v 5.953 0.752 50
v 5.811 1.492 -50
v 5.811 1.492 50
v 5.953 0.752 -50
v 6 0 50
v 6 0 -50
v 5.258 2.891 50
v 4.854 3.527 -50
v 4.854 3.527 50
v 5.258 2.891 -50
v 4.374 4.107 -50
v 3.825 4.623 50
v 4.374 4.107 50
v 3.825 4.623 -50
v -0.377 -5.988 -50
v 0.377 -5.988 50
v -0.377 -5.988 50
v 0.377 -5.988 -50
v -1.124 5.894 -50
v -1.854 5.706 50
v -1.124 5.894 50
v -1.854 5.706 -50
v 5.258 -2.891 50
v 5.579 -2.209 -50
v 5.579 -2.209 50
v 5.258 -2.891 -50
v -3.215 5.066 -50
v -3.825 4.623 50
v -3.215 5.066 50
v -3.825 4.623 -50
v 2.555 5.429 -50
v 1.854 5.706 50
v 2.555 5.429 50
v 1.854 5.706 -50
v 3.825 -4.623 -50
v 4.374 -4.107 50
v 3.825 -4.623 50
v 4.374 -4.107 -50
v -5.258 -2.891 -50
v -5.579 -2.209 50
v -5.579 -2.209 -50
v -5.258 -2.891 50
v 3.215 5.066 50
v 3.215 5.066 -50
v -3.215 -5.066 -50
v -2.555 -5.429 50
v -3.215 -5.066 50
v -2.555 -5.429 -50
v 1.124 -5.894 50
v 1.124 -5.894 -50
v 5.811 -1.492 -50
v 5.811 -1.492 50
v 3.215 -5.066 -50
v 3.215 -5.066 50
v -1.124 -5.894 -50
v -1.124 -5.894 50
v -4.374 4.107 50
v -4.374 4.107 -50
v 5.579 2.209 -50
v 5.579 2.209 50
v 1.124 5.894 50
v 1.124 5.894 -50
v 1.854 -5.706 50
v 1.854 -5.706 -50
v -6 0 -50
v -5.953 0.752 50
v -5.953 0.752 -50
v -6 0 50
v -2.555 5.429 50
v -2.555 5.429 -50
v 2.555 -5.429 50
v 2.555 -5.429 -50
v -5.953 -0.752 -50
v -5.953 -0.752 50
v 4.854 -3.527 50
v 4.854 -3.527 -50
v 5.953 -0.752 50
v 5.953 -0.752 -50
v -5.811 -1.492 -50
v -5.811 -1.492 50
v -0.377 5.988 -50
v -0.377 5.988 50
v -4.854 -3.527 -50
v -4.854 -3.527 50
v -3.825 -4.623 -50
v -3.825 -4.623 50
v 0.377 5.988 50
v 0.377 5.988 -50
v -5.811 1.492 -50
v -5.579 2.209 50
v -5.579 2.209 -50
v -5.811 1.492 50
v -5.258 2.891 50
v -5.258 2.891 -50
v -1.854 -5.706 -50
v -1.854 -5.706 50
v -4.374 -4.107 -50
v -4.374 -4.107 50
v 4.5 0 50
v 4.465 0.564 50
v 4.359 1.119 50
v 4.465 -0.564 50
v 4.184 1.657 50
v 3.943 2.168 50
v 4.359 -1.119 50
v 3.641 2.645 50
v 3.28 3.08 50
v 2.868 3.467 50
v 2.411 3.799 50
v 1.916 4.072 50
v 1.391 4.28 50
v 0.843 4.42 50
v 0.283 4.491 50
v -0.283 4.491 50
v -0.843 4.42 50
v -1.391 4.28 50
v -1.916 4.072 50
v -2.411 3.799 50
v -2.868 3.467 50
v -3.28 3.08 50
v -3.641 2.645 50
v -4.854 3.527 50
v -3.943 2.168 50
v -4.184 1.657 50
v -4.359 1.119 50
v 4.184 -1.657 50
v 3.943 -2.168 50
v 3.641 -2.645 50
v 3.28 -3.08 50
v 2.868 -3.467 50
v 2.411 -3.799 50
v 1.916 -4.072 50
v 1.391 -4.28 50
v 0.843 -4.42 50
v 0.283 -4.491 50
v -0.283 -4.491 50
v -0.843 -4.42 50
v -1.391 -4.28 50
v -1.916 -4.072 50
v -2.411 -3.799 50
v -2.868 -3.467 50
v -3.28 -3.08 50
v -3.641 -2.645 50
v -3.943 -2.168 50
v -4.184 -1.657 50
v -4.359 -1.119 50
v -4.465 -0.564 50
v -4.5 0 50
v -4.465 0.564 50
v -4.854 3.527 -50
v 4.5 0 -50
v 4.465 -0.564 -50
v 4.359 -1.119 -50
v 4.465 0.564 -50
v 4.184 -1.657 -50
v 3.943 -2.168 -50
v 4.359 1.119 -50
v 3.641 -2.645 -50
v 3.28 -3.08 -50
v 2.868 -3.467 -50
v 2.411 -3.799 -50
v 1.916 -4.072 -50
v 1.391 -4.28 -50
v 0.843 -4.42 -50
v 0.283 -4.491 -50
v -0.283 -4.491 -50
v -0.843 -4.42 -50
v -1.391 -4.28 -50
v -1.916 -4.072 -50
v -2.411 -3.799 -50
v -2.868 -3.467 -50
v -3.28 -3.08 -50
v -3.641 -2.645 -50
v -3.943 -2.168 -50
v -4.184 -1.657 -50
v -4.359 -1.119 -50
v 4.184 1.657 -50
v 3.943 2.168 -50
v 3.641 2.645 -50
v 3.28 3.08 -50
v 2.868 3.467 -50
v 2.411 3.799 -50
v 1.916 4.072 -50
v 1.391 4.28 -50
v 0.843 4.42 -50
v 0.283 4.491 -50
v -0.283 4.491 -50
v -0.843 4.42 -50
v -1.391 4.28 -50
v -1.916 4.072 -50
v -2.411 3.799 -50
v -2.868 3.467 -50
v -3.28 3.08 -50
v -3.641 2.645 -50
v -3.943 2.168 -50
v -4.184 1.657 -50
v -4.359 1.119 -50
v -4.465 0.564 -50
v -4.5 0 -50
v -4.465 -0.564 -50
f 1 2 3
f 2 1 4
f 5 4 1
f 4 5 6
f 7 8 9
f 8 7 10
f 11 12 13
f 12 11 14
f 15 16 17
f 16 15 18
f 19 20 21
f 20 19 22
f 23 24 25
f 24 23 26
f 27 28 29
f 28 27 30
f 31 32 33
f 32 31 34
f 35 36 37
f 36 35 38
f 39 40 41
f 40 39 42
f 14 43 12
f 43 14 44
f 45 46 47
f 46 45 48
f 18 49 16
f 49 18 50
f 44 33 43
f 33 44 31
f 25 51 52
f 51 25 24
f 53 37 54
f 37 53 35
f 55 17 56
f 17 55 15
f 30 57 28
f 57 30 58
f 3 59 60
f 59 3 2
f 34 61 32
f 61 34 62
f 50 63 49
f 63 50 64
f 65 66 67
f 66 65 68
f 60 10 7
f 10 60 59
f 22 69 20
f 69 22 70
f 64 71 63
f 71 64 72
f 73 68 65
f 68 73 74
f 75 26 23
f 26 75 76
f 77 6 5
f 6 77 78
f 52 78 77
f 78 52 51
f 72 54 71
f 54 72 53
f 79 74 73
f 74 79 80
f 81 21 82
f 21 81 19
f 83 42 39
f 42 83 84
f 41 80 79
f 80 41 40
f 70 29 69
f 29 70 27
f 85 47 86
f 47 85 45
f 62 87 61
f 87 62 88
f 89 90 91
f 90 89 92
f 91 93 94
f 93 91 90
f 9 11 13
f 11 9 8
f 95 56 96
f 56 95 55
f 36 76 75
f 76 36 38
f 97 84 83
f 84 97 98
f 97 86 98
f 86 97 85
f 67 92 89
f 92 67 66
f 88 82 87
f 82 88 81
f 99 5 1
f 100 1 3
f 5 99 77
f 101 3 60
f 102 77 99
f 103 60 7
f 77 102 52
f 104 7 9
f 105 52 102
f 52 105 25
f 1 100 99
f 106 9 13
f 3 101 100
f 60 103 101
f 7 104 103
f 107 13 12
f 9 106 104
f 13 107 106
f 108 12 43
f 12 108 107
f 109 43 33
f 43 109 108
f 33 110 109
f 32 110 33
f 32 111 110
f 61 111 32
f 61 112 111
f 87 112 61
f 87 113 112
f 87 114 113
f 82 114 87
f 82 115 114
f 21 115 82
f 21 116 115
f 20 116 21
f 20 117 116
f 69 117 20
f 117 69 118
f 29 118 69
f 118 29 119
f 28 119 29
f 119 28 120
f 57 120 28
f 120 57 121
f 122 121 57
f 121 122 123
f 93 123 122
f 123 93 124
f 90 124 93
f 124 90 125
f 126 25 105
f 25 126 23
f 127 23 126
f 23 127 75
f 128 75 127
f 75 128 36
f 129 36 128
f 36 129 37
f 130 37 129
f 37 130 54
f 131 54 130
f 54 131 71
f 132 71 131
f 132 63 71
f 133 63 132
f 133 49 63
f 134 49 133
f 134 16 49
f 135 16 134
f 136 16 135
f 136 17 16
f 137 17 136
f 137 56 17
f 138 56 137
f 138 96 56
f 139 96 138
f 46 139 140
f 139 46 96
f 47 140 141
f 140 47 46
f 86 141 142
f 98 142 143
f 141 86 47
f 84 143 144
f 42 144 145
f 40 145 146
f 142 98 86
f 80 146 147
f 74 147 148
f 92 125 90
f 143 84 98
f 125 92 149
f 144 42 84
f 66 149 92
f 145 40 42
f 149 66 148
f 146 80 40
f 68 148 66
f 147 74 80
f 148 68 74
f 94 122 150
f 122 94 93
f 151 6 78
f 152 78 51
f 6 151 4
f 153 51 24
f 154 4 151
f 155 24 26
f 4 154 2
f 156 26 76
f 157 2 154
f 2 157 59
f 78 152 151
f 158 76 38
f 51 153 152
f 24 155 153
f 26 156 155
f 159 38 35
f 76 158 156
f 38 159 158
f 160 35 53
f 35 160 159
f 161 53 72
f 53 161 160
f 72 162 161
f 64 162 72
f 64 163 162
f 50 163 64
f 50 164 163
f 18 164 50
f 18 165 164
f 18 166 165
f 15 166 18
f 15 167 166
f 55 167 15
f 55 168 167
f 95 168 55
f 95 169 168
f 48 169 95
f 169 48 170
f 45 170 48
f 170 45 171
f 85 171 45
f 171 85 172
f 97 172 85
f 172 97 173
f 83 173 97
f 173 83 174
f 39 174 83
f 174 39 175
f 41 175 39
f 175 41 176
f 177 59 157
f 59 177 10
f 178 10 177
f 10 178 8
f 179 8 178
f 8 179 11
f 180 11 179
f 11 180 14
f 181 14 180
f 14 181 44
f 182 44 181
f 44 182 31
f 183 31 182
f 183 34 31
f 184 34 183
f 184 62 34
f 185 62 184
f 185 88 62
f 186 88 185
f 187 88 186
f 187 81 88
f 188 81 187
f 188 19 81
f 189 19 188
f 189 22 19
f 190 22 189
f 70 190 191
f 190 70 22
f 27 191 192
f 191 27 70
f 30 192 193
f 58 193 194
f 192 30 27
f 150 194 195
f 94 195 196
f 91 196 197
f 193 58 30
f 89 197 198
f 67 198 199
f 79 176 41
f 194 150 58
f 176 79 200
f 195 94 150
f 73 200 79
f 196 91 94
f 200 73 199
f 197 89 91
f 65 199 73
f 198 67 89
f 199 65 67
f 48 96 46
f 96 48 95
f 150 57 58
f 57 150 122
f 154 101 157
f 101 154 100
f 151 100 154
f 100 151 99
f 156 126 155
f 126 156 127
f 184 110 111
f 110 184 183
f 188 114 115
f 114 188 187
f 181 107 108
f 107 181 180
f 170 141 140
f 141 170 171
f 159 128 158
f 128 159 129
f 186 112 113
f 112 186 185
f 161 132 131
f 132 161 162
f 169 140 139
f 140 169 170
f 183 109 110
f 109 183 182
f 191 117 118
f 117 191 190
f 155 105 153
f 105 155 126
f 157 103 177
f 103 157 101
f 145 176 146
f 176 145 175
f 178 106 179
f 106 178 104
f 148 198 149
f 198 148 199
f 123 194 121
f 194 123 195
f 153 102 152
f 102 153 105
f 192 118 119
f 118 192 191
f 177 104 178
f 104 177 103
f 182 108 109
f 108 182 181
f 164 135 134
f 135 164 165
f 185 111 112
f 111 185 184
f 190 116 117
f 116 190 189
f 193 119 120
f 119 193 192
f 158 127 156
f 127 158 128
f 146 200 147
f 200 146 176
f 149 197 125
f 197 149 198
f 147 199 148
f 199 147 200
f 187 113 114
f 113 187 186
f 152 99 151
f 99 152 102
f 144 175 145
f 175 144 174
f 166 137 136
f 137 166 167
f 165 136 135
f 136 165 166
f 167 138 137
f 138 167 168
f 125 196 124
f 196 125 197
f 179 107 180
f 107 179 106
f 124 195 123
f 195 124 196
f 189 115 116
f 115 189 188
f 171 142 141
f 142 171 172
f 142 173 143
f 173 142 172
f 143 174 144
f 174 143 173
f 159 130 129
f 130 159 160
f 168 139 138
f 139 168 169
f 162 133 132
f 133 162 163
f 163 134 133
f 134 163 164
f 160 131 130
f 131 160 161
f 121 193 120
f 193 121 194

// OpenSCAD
$fn = 50;


difference() {
	union() {
		translate(v = [0, 0, -50.0000000000]) {
			cylinder(h = 100, r = 6.0000000000);
		}
	}
	union() {
		translate(v = [0, 0, -100.0000000000]) {
			cylinder(h = 200, r = 4.5000000000);
		}
	}
}
